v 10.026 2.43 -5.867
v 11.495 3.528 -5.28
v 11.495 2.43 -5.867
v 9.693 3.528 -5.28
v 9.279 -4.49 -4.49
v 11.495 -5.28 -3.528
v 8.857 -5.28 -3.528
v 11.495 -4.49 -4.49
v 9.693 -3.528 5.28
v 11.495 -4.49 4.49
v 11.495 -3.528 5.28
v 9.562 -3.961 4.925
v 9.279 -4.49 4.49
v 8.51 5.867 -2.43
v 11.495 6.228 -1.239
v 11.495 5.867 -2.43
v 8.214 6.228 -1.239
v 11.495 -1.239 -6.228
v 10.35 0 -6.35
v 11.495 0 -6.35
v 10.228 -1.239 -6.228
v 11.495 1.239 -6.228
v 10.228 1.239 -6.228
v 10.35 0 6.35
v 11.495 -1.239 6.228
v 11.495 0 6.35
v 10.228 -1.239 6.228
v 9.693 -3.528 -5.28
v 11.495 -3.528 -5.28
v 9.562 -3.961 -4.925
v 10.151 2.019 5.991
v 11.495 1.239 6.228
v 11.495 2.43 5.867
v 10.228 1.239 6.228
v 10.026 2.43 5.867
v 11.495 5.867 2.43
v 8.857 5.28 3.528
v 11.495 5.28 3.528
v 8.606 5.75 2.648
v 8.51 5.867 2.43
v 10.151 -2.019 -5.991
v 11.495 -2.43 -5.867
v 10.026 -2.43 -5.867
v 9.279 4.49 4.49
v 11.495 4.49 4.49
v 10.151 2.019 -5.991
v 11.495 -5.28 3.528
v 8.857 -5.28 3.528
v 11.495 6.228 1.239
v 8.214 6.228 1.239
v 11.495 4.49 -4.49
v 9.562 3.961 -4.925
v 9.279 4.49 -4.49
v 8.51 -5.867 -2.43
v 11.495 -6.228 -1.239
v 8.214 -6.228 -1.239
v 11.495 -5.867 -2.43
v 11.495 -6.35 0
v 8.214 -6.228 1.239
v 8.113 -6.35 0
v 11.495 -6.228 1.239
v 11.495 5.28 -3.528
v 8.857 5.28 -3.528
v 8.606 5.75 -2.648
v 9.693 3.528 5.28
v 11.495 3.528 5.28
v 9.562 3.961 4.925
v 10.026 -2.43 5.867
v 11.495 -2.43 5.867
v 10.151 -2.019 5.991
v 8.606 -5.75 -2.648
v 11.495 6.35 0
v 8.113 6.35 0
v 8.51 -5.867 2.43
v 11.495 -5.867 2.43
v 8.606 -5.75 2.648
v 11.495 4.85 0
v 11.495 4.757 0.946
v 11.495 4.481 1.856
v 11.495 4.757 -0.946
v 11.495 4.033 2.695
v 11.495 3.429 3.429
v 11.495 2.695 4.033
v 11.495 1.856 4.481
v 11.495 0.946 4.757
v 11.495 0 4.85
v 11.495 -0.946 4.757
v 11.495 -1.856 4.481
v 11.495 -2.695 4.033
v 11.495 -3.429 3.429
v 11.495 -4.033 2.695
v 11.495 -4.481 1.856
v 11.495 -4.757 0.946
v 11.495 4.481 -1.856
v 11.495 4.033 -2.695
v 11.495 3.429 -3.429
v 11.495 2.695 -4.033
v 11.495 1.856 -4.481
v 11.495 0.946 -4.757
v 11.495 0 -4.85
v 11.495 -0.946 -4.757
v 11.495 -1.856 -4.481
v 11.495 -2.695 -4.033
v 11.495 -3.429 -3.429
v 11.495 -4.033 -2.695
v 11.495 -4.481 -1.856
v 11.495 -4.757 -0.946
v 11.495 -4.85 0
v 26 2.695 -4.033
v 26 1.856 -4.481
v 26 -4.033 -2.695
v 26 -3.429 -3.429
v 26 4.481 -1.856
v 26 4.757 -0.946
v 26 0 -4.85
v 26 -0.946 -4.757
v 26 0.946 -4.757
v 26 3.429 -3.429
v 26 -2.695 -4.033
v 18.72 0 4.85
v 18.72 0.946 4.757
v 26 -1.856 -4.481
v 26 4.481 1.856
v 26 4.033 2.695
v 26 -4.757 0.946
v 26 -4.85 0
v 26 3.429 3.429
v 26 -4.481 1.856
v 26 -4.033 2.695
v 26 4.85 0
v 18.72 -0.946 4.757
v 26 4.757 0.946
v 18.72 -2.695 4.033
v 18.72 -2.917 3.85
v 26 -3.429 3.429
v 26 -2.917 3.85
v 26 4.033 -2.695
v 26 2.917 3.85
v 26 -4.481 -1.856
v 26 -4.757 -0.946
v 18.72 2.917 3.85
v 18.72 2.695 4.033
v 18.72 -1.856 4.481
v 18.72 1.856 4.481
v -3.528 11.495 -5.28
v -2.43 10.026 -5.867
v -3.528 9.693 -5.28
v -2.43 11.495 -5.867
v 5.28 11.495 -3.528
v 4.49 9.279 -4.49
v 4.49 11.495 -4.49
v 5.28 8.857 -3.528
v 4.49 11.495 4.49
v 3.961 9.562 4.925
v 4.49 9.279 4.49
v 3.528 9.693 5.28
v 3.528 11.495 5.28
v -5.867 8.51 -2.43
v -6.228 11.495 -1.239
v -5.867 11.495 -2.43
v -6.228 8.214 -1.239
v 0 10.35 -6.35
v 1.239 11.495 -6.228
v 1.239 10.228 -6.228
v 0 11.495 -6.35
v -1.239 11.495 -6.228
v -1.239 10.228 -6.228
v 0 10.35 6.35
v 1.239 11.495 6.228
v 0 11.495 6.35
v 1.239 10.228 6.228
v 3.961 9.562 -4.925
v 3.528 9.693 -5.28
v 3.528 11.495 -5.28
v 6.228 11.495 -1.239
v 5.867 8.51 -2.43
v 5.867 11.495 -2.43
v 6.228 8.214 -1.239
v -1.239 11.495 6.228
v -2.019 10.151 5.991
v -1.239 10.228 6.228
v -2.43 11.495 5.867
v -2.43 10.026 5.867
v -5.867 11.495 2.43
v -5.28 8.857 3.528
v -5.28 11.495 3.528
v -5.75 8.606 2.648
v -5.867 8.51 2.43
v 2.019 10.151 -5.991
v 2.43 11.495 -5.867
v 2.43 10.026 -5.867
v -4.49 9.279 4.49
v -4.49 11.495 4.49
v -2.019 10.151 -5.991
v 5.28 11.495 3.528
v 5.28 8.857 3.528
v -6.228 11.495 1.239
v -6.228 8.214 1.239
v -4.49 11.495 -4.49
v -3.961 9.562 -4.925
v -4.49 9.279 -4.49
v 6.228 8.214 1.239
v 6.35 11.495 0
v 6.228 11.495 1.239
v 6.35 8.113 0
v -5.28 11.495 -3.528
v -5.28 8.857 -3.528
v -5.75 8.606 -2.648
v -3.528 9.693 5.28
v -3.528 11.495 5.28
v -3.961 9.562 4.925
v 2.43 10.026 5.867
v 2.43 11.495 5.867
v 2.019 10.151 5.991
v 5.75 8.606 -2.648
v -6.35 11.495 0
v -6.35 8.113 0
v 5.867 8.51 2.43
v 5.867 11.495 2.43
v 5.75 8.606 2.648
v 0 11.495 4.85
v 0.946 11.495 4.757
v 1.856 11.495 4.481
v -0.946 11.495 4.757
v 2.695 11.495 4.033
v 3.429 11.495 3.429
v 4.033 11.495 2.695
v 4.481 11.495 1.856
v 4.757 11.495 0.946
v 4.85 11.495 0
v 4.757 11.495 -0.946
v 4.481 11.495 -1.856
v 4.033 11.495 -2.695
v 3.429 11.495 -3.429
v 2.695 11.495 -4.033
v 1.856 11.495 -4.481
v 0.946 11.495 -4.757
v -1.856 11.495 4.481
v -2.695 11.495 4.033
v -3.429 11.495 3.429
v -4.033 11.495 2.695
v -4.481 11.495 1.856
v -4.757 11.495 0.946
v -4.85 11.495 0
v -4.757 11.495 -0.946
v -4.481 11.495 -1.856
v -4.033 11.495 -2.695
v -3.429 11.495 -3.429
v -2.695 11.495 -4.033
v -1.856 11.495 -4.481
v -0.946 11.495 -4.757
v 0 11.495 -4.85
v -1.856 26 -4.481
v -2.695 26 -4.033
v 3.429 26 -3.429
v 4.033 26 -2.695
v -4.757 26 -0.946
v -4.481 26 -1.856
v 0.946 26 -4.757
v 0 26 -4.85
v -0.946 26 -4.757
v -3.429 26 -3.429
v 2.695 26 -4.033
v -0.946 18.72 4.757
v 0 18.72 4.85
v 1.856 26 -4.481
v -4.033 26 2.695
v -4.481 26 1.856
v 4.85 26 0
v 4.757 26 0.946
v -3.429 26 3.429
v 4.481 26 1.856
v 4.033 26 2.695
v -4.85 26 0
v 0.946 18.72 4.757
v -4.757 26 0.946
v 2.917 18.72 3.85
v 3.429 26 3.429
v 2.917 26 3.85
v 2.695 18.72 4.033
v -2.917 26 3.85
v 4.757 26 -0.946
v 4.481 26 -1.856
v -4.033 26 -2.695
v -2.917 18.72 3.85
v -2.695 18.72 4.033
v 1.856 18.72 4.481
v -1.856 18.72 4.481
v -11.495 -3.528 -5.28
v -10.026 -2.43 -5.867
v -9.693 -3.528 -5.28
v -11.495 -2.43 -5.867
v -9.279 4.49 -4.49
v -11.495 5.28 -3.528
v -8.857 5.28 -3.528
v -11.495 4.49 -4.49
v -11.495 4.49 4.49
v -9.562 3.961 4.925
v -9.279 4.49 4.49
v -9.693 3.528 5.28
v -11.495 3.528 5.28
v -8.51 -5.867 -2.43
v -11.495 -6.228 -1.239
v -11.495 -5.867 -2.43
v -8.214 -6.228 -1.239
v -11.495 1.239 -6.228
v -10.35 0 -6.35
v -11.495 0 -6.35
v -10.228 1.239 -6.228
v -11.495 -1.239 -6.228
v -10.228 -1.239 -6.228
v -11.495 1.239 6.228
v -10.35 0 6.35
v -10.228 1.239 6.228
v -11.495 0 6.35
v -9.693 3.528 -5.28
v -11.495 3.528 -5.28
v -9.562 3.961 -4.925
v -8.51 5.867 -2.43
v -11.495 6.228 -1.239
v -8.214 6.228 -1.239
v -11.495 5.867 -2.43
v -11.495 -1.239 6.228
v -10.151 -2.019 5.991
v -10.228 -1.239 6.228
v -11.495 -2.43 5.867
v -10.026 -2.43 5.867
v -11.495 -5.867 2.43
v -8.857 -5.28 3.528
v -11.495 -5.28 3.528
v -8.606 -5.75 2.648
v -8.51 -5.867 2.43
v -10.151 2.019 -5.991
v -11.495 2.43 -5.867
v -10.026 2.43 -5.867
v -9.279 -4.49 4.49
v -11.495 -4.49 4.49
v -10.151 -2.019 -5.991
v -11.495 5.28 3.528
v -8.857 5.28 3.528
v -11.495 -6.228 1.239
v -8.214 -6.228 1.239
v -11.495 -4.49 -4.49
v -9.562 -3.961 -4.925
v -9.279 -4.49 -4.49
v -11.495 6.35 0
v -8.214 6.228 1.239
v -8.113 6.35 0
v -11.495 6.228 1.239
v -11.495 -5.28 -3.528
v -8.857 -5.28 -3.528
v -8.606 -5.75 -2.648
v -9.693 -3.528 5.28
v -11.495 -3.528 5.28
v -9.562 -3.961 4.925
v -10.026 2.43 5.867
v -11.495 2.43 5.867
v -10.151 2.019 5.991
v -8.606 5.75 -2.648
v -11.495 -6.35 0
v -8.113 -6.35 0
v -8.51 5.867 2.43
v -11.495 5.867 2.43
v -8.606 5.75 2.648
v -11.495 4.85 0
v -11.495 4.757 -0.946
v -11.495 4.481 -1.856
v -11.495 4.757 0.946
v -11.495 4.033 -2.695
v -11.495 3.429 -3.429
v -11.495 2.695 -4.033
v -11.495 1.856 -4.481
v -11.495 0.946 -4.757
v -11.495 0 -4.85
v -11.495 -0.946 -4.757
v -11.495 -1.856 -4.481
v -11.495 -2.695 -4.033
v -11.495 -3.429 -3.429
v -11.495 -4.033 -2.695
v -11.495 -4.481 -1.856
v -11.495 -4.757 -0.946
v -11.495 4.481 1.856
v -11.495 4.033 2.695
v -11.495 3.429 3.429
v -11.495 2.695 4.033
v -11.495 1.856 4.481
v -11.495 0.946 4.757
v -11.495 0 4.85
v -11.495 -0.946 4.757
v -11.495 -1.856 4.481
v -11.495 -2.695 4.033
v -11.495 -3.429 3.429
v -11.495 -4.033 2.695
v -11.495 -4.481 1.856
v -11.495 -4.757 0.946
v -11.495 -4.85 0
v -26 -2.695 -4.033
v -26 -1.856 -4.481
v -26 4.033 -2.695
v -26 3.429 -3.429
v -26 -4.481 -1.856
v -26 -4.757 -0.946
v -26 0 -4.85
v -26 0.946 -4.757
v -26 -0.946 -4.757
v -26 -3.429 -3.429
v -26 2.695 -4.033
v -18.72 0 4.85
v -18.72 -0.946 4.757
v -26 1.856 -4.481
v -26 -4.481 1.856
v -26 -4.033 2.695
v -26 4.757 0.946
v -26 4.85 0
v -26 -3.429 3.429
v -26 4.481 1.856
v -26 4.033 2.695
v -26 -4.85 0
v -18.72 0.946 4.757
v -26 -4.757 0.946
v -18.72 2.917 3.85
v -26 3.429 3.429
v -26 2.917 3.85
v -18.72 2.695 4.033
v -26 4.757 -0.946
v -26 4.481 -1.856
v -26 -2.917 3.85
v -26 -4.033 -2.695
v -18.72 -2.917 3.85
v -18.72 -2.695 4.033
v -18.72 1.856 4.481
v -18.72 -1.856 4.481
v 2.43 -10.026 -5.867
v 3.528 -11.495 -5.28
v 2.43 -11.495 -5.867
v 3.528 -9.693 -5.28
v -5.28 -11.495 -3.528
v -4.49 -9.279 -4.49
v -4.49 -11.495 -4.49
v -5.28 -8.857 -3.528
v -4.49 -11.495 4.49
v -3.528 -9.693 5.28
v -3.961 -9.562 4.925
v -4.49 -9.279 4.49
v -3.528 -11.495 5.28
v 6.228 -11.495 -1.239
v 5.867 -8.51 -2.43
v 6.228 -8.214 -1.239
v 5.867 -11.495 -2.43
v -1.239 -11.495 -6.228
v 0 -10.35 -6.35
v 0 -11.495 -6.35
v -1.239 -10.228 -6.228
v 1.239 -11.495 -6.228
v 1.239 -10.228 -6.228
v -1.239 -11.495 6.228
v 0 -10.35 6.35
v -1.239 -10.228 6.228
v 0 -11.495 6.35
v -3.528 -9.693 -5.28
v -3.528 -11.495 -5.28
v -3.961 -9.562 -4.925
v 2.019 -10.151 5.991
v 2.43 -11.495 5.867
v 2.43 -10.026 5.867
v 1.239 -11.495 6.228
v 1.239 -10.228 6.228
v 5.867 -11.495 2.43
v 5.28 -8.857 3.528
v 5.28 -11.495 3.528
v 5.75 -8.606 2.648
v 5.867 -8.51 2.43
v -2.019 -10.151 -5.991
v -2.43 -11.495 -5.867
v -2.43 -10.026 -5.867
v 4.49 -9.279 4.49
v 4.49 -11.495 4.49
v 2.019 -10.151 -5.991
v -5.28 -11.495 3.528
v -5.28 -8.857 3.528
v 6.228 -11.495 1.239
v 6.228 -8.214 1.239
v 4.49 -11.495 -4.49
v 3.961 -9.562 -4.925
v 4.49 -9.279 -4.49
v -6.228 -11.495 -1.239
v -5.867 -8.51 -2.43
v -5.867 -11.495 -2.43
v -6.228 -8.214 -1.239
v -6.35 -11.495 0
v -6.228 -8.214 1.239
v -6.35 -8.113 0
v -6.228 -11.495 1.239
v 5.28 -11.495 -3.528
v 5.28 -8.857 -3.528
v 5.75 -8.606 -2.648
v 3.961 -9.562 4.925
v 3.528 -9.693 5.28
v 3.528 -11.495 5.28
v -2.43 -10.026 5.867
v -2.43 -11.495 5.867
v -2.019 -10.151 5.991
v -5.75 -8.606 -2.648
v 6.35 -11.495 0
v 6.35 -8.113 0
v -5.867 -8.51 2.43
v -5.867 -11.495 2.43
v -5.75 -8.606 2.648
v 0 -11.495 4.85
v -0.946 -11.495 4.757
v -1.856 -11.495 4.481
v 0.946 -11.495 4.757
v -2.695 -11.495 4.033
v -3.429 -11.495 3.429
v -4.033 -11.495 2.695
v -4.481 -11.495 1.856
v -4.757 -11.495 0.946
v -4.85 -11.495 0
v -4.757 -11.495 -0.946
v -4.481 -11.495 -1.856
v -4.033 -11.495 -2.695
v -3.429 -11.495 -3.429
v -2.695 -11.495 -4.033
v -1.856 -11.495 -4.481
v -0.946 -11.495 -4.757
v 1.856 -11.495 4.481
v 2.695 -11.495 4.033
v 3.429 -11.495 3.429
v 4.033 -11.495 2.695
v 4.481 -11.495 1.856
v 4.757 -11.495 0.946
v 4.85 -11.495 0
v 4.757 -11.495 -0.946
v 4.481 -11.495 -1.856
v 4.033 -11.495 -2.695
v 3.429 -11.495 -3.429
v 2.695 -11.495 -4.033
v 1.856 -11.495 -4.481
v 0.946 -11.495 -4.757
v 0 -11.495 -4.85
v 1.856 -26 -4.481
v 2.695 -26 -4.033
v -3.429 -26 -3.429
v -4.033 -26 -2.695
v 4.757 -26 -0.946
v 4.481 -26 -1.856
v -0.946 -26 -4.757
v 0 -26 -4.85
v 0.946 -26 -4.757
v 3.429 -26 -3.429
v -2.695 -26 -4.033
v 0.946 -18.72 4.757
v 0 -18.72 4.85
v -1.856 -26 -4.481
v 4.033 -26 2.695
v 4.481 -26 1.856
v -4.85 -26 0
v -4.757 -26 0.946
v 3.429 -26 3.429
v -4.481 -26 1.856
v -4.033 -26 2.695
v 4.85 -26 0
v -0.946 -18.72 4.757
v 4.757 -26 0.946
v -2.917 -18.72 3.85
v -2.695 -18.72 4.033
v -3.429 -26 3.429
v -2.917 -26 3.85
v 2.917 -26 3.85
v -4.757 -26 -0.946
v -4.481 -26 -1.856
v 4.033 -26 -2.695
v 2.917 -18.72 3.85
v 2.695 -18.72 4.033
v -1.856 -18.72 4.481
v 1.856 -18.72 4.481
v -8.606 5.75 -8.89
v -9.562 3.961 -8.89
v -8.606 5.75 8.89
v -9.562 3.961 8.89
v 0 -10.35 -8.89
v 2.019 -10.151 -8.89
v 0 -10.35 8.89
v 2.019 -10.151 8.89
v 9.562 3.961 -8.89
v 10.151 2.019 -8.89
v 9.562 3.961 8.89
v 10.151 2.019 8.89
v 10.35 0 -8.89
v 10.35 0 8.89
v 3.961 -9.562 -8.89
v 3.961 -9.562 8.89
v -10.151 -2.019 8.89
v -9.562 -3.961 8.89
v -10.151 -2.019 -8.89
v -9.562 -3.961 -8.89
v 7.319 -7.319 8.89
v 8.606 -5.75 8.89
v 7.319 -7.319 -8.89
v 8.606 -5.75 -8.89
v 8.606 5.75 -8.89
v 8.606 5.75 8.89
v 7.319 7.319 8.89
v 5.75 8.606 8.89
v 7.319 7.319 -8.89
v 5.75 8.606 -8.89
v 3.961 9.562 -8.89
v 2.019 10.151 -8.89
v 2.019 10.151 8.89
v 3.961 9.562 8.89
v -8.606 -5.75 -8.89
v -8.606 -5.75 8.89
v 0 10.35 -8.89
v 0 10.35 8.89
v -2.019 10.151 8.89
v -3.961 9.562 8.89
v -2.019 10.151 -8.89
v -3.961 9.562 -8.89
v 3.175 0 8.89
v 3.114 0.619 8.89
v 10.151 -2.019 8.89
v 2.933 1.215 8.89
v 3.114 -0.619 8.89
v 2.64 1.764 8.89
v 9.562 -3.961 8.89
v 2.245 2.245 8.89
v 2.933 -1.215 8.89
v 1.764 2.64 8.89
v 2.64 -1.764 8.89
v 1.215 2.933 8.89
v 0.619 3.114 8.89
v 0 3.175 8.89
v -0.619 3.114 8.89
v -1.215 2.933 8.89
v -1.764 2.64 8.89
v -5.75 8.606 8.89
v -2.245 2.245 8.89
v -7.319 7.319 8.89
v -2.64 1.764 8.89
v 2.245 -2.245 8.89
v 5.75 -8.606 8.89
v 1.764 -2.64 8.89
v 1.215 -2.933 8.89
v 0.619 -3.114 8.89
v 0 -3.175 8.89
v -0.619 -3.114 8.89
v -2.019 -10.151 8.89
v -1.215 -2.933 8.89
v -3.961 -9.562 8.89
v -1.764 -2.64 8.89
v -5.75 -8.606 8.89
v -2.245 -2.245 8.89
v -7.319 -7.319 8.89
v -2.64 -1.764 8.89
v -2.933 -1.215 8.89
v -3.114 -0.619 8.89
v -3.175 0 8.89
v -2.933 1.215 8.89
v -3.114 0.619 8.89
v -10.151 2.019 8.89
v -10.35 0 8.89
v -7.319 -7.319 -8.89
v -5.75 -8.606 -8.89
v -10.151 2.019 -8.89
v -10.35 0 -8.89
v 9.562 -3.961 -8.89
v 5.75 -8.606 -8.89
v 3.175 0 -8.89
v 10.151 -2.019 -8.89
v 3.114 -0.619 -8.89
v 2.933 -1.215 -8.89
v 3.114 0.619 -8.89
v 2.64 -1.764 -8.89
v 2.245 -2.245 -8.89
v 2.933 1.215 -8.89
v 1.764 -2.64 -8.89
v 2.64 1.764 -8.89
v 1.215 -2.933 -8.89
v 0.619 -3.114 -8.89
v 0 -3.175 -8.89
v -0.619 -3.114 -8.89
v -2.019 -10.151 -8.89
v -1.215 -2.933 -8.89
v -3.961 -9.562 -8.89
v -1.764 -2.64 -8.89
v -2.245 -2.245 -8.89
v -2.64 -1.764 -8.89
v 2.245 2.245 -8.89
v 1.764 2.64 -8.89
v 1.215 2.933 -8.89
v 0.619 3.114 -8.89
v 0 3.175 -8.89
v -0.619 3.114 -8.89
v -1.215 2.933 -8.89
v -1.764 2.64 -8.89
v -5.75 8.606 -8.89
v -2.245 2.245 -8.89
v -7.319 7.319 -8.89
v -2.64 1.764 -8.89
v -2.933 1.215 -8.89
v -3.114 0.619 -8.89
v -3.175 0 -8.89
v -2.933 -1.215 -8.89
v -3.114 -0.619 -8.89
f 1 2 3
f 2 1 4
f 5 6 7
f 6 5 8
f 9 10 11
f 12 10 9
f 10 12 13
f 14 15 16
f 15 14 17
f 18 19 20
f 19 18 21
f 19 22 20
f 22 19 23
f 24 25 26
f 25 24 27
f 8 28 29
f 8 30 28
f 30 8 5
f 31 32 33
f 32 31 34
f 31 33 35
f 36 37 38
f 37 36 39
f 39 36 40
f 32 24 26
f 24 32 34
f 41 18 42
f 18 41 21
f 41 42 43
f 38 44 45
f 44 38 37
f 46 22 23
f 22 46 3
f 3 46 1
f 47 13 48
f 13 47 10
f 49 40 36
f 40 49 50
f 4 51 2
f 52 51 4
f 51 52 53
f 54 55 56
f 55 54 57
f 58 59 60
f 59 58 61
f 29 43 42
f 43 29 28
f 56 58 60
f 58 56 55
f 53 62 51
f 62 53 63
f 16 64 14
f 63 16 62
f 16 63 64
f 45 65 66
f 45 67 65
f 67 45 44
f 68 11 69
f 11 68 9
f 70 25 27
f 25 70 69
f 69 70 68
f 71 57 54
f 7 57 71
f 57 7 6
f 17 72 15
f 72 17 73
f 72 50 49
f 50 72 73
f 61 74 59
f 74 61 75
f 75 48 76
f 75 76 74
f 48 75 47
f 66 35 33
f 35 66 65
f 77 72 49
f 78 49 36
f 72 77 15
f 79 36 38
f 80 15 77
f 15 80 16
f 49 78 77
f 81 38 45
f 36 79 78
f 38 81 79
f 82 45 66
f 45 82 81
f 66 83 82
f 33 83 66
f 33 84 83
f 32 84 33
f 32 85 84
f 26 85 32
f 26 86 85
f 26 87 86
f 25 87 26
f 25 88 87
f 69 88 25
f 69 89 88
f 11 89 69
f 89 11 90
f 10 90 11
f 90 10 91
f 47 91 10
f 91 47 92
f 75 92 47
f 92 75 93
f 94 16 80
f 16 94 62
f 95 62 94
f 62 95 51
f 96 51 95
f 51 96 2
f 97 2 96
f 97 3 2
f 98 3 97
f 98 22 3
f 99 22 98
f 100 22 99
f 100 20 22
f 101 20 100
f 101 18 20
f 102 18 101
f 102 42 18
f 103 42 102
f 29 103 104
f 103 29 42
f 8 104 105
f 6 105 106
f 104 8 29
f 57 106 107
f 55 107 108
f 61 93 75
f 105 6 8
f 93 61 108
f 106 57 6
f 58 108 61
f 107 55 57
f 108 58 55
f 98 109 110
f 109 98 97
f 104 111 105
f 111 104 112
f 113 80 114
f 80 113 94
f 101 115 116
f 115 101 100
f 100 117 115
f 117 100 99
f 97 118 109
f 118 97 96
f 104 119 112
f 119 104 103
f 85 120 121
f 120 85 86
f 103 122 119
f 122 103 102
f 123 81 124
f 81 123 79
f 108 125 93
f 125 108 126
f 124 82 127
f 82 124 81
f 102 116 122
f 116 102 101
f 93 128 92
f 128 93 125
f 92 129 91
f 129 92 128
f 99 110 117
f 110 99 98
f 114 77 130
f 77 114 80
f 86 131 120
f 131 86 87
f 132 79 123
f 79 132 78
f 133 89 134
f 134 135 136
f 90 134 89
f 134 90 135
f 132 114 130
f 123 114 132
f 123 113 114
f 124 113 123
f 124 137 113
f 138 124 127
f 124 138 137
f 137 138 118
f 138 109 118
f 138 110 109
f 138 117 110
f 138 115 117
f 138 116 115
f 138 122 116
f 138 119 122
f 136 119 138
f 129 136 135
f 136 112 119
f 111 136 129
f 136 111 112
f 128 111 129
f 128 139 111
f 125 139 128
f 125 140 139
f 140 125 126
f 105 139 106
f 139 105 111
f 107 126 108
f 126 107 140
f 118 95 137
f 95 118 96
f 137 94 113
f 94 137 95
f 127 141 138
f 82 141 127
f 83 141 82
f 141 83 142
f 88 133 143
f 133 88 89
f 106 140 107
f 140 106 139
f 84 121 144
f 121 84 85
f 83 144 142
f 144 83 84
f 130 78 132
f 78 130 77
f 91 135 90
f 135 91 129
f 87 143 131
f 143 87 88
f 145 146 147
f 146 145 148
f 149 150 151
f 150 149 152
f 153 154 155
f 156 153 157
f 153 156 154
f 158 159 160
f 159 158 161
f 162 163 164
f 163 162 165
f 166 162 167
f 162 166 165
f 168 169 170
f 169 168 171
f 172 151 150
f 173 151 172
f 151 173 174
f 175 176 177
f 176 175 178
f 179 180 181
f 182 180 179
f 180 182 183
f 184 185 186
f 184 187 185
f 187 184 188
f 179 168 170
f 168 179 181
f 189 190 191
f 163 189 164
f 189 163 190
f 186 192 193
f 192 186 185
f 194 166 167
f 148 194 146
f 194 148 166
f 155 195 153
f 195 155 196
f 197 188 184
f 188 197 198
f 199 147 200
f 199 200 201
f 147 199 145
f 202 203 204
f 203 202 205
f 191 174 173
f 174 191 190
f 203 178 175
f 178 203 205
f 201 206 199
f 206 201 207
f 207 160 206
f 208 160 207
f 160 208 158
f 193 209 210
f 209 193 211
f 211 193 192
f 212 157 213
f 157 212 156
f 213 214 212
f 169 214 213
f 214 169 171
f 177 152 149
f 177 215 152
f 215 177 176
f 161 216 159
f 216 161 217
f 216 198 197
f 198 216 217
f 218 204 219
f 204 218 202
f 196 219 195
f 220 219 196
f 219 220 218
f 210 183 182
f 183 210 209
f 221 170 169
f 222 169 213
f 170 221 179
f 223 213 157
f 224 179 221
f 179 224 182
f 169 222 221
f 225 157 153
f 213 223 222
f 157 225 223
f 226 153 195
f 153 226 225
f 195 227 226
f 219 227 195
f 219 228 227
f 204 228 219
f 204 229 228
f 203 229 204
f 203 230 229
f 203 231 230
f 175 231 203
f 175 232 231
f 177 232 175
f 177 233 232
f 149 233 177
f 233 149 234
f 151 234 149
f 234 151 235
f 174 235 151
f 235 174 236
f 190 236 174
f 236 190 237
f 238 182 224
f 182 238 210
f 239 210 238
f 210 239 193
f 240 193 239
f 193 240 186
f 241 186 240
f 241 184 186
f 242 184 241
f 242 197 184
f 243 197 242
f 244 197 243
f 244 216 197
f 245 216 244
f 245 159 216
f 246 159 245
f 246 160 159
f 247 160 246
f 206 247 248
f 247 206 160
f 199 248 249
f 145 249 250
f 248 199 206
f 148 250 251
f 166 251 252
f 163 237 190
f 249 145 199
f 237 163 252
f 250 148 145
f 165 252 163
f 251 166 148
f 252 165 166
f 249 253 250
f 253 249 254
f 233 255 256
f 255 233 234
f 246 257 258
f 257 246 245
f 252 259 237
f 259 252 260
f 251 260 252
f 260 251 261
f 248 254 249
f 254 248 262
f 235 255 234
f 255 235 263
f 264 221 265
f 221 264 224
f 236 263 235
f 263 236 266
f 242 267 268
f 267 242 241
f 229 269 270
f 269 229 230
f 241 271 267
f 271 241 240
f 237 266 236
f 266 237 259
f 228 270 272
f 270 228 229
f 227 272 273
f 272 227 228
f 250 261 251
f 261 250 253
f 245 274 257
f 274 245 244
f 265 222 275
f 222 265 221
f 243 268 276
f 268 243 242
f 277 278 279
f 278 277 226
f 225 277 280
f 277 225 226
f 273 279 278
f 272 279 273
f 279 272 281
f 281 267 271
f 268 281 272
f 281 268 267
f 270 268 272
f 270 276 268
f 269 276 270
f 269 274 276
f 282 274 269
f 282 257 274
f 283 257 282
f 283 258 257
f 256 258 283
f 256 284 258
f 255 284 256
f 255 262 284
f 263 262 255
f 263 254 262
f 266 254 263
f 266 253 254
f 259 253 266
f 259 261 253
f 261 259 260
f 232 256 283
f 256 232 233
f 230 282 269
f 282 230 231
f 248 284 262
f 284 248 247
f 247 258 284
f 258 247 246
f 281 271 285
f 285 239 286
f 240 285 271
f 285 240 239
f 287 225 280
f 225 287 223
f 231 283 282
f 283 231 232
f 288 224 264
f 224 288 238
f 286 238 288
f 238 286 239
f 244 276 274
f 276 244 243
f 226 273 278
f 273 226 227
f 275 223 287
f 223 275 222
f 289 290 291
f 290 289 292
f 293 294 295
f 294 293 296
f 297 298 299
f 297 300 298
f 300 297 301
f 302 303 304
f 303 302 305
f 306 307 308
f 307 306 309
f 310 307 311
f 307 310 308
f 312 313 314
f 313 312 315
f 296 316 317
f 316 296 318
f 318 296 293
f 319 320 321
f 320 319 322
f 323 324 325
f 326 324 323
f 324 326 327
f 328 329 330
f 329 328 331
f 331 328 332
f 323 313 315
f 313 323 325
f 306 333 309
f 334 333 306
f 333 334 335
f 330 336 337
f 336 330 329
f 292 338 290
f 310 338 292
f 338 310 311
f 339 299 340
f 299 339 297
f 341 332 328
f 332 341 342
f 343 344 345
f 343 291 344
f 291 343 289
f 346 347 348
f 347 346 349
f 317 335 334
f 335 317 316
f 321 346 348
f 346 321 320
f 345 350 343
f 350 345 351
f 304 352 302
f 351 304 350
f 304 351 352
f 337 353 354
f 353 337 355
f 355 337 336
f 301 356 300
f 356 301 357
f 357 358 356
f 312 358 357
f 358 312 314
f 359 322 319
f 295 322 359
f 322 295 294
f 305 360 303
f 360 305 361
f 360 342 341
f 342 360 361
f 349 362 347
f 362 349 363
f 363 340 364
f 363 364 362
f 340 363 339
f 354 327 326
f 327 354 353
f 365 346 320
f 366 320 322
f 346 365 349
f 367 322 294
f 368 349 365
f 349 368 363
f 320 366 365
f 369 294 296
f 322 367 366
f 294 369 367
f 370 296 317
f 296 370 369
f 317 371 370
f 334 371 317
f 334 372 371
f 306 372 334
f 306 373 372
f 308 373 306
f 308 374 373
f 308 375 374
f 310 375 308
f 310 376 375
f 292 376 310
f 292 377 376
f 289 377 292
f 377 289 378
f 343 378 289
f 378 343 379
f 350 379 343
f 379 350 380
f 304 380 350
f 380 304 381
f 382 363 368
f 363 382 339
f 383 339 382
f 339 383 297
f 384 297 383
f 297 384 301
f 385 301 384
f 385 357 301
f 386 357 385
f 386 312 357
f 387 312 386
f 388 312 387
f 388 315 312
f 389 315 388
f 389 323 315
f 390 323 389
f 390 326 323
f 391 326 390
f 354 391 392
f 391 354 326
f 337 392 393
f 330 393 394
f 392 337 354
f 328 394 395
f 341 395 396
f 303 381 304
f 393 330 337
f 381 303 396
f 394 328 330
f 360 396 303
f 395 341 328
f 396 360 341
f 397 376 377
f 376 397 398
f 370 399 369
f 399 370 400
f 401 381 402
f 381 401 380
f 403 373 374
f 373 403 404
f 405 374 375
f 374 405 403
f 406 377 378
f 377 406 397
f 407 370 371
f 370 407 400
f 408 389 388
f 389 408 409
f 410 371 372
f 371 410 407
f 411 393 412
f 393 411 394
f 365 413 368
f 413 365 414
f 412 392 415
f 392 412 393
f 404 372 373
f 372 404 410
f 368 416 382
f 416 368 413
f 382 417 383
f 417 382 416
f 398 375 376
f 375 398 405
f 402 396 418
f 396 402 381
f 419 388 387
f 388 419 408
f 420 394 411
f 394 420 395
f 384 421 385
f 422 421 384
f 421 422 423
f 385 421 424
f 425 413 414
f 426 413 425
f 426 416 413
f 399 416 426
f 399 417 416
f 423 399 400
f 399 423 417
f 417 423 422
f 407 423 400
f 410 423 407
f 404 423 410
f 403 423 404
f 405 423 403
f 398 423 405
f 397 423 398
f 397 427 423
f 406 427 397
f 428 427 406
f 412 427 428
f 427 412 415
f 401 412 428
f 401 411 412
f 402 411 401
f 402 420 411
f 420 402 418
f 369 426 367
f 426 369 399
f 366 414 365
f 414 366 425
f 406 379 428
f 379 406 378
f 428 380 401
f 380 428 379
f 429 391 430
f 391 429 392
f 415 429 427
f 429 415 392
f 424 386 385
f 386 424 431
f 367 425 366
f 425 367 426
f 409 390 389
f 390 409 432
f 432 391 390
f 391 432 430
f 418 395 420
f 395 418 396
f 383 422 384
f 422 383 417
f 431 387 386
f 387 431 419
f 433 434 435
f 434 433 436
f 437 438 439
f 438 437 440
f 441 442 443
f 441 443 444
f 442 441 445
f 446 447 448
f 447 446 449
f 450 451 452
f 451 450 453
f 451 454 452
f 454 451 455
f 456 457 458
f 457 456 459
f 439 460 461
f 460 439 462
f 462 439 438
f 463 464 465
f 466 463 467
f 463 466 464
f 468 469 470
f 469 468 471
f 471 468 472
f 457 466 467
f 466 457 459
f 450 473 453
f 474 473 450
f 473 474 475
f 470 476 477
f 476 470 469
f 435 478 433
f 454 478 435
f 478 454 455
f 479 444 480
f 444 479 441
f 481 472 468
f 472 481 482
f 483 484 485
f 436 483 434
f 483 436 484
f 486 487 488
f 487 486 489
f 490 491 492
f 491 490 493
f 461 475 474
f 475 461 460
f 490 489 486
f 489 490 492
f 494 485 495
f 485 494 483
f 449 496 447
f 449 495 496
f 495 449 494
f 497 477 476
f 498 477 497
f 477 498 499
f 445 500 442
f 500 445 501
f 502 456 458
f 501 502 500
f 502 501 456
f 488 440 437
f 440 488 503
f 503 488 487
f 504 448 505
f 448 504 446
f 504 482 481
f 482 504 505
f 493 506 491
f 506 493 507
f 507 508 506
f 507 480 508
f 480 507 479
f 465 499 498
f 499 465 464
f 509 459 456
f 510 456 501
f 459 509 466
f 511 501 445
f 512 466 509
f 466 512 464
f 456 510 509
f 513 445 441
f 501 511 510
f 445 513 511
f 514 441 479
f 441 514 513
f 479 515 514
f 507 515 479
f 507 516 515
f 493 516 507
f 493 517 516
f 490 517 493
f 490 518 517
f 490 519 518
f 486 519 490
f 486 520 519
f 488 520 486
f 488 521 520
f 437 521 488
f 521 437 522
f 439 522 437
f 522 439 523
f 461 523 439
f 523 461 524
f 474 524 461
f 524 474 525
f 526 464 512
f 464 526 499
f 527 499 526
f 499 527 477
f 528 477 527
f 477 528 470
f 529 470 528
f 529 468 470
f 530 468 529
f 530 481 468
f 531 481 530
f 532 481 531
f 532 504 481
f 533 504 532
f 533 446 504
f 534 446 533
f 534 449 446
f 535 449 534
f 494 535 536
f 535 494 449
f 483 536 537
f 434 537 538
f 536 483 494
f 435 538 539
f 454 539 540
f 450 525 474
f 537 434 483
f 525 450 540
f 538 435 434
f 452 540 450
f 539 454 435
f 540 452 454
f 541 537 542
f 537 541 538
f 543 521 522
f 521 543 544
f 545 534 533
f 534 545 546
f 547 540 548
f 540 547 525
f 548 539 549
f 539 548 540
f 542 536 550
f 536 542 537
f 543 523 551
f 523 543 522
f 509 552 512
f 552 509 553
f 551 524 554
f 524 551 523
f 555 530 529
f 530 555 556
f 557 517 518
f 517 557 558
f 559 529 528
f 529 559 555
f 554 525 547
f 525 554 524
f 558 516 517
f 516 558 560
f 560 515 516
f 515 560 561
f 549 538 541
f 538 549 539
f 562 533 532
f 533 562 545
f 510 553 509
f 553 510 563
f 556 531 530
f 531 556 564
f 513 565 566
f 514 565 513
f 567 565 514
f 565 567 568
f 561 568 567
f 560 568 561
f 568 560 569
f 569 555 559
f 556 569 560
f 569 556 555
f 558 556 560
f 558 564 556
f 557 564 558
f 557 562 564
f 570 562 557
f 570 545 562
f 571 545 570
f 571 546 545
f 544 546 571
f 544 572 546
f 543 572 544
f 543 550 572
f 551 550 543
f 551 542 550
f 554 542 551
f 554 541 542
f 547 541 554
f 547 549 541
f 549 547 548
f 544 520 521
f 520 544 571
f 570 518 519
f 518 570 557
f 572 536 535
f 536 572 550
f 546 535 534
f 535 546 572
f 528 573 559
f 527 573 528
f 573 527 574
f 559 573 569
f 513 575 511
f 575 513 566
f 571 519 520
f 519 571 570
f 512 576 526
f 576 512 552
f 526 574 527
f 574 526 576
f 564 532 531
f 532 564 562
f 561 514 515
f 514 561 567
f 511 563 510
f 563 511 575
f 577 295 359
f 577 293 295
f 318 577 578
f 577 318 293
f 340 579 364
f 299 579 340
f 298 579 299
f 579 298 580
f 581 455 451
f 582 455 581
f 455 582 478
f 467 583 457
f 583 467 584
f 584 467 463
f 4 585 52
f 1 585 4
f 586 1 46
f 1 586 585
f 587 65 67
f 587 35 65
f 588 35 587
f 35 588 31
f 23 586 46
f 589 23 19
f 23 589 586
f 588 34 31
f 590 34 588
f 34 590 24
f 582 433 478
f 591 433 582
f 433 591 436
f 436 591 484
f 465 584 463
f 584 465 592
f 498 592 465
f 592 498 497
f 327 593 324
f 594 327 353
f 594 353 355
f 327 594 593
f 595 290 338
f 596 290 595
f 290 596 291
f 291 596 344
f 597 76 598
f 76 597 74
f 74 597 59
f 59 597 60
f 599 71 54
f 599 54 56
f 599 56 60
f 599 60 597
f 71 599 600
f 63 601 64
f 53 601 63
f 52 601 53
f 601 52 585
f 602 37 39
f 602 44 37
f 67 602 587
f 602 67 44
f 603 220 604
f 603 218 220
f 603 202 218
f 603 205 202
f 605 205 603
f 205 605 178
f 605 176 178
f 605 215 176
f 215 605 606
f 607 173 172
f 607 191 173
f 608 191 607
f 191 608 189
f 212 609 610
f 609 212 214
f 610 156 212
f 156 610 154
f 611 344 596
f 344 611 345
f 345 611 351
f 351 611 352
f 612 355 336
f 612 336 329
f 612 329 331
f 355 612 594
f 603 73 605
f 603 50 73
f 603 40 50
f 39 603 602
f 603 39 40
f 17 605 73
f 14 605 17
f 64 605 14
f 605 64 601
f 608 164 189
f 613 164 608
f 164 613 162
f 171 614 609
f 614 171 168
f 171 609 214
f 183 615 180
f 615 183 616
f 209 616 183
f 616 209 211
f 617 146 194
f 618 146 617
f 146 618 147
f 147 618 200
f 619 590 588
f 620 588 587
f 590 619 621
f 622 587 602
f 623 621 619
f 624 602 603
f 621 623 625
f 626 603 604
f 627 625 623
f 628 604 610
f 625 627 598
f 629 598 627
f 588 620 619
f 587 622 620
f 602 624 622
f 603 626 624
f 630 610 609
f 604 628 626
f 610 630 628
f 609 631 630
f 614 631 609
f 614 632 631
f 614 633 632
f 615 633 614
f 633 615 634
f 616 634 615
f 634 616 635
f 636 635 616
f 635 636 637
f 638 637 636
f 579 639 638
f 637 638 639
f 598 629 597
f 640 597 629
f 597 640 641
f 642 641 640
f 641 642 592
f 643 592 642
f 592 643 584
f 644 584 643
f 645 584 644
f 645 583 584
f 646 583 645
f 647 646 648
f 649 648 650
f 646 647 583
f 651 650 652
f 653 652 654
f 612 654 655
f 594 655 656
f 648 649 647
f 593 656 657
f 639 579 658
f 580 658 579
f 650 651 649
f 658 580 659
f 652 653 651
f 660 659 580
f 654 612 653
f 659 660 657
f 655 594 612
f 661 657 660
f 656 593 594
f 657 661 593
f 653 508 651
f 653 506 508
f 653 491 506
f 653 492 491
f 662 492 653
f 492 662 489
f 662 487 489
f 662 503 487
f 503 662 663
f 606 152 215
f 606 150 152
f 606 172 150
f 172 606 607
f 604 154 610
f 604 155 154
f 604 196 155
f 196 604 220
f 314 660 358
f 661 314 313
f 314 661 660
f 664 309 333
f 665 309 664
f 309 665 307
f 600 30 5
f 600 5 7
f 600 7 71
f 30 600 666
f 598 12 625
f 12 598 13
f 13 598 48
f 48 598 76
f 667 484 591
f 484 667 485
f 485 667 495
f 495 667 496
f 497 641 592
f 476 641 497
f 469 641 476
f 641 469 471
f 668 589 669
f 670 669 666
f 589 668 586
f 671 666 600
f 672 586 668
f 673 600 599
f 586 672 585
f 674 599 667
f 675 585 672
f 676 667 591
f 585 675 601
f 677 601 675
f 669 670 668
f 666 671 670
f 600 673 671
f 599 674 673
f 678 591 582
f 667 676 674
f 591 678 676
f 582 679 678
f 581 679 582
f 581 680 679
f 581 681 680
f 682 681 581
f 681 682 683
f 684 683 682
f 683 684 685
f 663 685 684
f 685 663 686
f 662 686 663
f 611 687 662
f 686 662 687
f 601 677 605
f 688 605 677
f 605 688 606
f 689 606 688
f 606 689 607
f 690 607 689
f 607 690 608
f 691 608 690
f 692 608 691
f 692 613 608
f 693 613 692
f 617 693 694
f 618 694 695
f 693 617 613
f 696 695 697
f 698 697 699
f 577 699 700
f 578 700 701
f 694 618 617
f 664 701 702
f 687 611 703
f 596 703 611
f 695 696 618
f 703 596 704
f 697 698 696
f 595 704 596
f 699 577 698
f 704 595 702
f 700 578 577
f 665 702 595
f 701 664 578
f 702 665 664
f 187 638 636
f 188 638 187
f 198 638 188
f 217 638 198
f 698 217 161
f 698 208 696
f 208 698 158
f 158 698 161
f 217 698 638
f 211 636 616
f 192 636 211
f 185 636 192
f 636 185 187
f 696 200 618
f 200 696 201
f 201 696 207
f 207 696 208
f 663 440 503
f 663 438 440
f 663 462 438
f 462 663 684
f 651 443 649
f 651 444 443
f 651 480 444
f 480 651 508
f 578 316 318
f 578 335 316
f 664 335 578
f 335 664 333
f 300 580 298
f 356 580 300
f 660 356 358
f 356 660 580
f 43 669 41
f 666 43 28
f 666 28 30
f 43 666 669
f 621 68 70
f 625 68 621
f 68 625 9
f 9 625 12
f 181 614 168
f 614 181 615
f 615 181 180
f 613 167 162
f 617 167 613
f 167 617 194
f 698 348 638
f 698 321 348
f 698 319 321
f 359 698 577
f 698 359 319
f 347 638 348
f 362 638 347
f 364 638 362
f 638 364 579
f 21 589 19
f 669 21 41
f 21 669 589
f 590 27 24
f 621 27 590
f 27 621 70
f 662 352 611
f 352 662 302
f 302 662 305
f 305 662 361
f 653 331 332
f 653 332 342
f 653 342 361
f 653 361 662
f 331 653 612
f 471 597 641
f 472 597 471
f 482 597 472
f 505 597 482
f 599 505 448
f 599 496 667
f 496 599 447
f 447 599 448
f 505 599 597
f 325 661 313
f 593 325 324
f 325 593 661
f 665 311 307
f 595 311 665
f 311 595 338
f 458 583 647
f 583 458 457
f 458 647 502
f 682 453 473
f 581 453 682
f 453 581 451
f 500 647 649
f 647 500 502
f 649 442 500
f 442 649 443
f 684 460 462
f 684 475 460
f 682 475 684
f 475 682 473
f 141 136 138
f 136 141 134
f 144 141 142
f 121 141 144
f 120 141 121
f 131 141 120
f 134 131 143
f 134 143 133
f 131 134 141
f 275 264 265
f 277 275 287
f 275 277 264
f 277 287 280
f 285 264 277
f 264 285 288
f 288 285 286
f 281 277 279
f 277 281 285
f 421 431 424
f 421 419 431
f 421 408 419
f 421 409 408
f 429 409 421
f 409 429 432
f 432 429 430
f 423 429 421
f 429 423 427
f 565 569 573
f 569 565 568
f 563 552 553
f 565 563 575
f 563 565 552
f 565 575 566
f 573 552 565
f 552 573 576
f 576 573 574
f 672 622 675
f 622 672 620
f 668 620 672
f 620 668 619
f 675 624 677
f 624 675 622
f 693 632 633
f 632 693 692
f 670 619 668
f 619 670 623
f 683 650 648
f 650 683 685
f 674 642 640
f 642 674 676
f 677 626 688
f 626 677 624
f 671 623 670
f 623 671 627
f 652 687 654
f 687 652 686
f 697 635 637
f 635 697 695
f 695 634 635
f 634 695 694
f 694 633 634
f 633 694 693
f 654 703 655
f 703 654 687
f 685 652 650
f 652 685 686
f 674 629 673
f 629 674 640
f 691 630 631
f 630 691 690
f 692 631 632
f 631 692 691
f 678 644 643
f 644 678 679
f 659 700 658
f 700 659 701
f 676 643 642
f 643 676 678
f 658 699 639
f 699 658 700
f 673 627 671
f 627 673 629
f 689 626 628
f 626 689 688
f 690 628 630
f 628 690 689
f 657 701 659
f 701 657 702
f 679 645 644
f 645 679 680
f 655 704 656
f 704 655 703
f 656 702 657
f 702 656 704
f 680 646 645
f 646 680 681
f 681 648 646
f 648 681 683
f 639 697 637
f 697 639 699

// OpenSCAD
$fn = 32;

// ----------------------------------------------------------------------
// Cardan cross: 52 mm span, 12.7 mm trunnions
// ----------------------------------------------------------------------

// --- parameters (mm) ---
journal_d = 12.7;         // trunnion diameter
arm_len = 26;             // trunnion length from the centre
step_r = 4.32;            // step position from the centre
step_d = 9.7;             // journal diameter after the step
hub_d = 20.7;             // hub diameter
hub_h = 17.78;            // hub height
bore_d = 6.35;            // hub bore
flat_d = 1;               // depth of the journal flat
flat_len = 7.28;          // length of the journal flat

difference() {
  union() {
    /* hub along the joint axis */
    cylinder(h = hub_h, d = hub_d, center = true);
    for (a = [0 : 90 : 270]) rotate([0, 0, a]) {
      /* trunnion, sunk into the hub */
      translate([hub_d / 4, 0, 0]) rotate([0, 90, 0]) cylinder(h = step_r + 2, d = journal_d);
      /* stepped journal out to the tip */
      translate([step_r - 0.5, 0, 0]) rotate([0, 90, 0]) cylinder(h = arm_len + 0.5 - step_r, d = step_d);
    }
  }
  /* lubrication bore through the hub, 2.5 mm clear on both sides */
  translate([0, 0, -hub_h / 2 - 2.5]) cylinder(h = hub_h + 5, d = bore_d);
  /* machined flat on each journal tip */
  for (a = [0 : 90 : 270]) rotate([0, 0, a]) {
    translate([arm_len - flat_len, -step_d, step_d / 2 - flat_d]) cube([flat_len + 0.5, 2 * step_d, flat_d + 2.5]);
  }
}
